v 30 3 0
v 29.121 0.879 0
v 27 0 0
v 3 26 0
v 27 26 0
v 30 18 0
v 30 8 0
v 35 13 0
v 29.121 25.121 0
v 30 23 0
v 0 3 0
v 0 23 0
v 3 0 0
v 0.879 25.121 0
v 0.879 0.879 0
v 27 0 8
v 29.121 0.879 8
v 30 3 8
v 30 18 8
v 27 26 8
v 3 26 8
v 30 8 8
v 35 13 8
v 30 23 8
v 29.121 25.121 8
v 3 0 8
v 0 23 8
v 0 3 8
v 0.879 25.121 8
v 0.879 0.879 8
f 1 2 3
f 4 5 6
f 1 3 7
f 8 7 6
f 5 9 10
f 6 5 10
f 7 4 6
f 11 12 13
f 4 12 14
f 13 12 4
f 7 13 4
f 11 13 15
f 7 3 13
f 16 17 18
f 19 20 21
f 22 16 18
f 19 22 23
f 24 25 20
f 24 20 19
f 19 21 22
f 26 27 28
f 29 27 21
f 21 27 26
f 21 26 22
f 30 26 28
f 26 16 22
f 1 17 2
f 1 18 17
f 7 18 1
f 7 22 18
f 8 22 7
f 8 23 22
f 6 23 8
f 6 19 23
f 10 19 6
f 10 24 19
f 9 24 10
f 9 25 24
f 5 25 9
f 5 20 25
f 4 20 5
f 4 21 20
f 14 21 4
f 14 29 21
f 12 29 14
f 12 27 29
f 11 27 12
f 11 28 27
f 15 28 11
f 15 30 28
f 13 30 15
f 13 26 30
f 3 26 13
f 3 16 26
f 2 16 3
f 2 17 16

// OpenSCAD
$fn = 32;

// ----------------------------------------------------------------------
// Ratchet pawl: 30 x 26 mm body, beak 5 mm с правого торца
// ----------------------------------------------------------------------

// --- parameters (mm) ---
profile_height = 8;       // extrusion height
profile_points = 15;      // points of the closed outline

profile = [[0, 3], [0.879, 0.879], [3, 0], [27, 0], [29.121, 0.879], [30, 3], [30, 8], [35, 13], [30, 18], [30, 23], [29.121, 25.121], [27, 26], [3, 26], [0.879, 25.121], [0, 23]];  // single closed polygon, 15 points, counter clockwise

// --- the one profile operation ---
linear_extrude(height = profile_height) polygon(points = profile);
